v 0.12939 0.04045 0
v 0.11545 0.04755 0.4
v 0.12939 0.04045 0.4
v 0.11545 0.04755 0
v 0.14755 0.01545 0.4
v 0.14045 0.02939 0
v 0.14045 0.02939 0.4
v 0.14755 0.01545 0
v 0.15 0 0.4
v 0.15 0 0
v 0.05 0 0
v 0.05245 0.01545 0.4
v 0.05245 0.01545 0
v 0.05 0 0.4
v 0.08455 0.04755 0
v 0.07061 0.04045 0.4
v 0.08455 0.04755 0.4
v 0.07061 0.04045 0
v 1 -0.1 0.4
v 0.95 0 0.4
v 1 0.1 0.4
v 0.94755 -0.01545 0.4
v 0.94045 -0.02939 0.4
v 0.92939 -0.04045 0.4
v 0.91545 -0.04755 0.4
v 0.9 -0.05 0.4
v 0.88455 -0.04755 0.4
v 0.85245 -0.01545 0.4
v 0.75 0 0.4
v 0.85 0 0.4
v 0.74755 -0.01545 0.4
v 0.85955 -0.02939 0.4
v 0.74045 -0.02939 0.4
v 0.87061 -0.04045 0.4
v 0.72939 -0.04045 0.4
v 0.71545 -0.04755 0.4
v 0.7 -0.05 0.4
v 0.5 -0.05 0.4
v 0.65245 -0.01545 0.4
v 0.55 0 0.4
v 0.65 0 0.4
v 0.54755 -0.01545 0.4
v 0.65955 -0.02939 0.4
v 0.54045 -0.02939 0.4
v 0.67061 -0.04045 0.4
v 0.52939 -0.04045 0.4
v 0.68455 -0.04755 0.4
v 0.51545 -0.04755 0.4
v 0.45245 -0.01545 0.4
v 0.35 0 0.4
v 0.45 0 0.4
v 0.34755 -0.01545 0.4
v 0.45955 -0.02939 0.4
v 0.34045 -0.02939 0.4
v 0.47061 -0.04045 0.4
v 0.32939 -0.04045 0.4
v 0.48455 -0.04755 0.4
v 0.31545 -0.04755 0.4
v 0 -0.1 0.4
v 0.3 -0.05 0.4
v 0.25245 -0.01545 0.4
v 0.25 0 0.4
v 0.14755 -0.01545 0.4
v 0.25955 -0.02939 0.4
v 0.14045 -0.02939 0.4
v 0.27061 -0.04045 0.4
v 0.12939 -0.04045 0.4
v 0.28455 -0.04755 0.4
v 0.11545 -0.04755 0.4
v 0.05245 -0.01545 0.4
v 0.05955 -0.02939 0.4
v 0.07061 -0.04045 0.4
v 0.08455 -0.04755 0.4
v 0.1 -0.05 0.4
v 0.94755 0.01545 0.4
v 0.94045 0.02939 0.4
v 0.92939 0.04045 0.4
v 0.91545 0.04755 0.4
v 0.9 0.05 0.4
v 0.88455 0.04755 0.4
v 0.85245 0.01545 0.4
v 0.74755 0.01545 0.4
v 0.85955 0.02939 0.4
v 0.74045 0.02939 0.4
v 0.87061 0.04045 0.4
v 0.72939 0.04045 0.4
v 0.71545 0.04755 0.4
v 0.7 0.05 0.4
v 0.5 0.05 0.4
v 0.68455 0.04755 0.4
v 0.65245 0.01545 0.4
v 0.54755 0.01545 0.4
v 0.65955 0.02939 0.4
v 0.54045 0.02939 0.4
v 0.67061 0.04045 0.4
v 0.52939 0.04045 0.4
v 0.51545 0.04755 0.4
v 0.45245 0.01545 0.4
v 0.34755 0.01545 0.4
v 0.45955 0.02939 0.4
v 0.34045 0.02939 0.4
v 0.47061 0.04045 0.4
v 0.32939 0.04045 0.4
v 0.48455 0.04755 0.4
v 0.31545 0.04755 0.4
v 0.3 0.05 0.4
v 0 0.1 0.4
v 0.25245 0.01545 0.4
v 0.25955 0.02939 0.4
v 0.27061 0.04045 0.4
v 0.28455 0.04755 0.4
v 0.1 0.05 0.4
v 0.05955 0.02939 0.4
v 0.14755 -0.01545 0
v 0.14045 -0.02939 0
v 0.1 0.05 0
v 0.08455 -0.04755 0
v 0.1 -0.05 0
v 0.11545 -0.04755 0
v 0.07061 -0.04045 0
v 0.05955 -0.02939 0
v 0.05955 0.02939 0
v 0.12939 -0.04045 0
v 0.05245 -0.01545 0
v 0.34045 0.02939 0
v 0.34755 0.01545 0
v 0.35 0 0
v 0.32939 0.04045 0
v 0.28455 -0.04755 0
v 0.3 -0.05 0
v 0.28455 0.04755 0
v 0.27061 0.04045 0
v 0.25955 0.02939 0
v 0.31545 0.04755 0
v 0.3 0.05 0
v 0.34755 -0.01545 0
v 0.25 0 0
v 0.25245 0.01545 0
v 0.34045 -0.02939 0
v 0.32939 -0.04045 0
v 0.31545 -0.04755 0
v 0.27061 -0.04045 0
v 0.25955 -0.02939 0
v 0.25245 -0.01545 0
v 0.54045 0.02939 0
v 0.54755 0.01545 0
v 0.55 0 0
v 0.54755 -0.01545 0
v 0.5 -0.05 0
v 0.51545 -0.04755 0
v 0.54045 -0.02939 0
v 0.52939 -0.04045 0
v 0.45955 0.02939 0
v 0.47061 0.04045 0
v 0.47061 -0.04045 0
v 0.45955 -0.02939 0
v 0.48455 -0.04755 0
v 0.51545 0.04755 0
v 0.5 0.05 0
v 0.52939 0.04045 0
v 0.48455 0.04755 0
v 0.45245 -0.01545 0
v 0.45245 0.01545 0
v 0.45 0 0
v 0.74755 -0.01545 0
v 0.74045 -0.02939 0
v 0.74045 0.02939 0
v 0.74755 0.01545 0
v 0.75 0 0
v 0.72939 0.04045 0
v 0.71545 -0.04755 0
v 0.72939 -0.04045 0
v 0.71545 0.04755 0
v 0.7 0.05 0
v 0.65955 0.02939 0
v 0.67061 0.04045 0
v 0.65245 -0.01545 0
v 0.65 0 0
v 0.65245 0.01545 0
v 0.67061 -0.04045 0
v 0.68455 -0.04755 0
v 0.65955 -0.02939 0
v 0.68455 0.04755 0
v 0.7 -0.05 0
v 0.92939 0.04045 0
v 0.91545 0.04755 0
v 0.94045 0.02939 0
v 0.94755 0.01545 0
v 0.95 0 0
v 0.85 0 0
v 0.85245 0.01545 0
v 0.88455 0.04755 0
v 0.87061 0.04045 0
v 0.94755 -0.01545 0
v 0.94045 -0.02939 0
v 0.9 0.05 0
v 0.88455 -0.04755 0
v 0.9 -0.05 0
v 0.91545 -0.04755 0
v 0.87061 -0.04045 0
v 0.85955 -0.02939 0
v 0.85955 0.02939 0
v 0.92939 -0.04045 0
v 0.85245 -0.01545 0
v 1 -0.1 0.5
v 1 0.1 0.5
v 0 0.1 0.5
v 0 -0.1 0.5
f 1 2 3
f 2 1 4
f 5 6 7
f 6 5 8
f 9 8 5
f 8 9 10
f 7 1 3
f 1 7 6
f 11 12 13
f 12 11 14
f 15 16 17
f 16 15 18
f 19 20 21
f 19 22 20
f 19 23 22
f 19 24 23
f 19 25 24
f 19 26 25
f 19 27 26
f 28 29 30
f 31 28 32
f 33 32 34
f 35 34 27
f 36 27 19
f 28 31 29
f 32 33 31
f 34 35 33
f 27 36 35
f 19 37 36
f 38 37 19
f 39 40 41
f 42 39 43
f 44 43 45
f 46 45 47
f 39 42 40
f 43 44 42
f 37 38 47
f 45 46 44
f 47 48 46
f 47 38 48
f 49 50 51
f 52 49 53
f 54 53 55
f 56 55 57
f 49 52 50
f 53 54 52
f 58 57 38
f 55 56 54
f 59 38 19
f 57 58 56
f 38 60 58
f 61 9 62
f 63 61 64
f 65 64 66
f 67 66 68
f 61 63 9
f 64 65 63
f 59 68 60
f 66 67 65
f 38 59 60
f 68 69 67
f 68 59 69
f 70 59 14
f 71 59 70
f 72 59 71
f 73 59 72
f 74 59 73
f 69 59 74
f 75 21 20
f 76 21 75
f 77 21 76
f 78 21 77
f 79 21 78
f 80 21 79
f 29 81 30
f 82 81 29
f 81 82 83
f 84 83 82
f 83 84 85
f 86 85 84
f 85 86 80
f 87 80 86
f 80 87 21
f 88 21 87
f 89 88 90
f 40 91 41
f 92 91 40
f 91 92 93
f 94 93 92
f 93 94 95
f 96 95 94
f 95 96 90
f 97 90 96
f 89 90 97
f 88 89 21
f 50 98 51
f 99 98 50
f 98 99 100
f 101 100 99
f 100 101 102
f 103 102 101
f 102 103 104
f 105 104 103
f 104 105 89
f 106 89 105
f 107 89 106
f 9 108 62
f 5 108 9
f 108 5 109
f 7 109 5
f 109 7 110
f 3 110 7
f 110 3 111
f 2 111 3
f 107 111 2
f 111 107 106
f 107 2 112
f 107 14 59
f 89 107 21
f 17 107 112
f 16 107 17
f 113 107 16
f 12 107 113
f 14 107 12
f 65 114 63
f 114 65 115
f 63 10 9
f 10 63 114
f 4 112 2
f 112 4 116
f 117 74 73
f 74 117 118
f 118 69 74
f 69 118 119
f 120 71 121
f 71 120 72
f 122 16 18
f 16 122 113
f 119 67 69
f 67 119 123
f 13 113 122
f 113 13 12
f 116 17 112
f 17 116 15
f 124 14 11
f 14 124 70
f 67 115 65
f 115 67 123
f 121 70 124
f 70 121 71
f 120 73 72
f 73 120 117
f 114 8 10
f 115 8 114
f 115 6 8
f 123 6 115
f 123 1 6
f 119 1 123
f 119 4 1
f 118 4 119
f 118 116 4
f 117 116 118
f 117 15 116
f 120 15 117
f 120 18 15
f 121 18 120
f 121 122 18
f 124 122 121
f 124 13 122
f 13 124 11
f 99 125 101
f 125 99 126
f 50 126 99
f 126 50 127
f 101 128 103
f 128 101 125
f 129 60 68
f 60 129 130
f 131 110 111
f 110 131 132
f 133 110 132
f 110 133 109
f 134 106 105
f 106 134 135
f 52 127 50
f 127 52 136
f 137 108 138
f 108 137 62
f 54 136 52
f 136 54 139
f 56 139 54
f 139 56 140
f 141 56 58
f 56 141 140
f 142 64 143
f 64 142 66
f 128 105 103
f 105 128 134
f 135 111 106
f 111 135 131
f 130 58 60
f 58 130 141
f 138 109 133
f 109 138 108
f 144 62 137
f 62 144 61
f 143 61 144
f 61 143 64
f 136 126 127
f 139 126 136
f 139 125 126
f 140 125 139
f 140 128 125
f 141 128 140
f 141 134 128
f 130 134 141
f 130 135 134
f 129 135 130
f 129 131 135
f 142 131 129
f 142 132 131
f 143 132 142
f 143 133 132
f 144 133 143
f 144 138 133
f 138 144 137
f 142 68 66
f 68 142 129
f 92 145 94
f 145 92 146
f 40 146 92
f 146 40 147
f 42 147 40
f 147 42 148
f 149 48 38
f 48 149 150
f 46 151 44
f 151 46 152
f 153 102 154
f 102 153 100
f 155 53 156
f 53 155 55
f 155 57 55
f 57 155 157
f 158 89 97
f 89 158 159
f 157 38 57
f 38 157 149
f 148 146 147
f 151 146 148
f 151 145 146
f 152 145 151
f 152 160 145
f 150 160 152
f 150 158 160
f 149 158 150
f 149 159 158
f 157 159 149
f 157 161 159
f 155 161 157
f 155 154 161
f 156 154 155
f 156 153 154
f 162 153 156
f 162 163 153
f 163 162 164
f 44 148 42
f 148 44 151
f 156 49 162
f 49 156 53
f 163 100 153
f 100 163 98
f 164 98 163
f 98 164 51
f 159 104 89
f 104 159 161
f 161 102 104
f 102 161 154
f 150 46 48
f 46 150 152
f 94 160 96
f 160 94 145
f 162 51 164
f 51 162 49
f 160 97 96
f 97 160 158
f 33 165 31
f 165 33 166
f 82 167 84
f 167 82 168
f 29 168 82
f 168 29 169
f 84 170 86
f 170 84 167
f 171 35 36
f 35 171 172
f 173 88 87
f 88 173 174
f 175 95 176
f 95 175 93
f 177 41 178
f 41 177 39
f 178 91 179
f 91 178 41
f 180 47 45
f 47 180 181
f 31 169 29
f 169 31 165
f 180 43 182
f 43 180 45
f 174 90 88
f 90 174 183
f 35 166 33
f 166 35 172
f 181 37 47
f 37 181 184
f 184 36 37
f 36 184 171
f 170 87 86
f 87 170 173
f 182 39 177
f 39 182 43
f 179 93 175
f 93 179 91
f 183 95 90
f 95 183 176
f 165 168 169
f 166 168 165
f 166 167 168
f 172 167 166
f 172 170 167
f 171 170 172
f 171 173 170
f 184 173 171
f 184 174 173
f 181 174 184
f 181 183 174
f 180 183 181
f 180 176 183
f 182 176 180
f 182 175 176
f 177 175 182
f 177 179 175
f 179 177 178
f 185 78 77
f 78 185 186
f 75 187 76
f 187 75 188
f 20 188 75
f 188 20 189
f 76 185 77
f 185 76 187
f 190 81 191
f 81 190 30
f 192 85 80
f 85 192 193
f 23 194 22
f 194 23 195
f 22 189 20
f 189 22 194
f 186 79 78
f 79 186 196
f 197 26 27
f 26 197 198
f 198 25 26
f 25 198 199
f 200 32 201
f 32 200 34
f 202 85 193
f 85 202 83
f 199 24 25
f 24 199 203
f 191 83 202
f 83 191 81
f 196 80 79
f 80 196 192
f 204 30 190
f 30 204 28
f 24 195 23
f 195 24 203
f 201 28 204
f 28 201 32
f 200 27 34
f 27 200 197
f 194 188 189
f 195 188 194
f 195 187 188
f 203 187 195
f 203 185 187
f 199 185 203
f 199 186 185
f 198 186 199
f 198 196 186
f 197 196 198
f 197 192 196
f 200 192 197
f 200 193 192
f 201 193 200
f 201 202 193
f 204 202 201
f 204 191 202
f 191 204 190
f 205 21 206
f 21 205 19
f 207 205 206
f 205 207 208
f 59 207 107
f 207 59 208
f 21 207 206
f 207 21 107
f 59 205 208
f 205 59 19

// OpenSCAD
length=1;
height=.4;
post_radius=0.05;
rail_radius=0.03;

// Posts
for (i = [0.1:0.2:1]) {
    translate([i * length, 0, 0]) {
        cylinder(h = height, r = post_radius, $fn = 20);
    }
}

translate([0, -.1, height])
cube([1, .2, .1]);
